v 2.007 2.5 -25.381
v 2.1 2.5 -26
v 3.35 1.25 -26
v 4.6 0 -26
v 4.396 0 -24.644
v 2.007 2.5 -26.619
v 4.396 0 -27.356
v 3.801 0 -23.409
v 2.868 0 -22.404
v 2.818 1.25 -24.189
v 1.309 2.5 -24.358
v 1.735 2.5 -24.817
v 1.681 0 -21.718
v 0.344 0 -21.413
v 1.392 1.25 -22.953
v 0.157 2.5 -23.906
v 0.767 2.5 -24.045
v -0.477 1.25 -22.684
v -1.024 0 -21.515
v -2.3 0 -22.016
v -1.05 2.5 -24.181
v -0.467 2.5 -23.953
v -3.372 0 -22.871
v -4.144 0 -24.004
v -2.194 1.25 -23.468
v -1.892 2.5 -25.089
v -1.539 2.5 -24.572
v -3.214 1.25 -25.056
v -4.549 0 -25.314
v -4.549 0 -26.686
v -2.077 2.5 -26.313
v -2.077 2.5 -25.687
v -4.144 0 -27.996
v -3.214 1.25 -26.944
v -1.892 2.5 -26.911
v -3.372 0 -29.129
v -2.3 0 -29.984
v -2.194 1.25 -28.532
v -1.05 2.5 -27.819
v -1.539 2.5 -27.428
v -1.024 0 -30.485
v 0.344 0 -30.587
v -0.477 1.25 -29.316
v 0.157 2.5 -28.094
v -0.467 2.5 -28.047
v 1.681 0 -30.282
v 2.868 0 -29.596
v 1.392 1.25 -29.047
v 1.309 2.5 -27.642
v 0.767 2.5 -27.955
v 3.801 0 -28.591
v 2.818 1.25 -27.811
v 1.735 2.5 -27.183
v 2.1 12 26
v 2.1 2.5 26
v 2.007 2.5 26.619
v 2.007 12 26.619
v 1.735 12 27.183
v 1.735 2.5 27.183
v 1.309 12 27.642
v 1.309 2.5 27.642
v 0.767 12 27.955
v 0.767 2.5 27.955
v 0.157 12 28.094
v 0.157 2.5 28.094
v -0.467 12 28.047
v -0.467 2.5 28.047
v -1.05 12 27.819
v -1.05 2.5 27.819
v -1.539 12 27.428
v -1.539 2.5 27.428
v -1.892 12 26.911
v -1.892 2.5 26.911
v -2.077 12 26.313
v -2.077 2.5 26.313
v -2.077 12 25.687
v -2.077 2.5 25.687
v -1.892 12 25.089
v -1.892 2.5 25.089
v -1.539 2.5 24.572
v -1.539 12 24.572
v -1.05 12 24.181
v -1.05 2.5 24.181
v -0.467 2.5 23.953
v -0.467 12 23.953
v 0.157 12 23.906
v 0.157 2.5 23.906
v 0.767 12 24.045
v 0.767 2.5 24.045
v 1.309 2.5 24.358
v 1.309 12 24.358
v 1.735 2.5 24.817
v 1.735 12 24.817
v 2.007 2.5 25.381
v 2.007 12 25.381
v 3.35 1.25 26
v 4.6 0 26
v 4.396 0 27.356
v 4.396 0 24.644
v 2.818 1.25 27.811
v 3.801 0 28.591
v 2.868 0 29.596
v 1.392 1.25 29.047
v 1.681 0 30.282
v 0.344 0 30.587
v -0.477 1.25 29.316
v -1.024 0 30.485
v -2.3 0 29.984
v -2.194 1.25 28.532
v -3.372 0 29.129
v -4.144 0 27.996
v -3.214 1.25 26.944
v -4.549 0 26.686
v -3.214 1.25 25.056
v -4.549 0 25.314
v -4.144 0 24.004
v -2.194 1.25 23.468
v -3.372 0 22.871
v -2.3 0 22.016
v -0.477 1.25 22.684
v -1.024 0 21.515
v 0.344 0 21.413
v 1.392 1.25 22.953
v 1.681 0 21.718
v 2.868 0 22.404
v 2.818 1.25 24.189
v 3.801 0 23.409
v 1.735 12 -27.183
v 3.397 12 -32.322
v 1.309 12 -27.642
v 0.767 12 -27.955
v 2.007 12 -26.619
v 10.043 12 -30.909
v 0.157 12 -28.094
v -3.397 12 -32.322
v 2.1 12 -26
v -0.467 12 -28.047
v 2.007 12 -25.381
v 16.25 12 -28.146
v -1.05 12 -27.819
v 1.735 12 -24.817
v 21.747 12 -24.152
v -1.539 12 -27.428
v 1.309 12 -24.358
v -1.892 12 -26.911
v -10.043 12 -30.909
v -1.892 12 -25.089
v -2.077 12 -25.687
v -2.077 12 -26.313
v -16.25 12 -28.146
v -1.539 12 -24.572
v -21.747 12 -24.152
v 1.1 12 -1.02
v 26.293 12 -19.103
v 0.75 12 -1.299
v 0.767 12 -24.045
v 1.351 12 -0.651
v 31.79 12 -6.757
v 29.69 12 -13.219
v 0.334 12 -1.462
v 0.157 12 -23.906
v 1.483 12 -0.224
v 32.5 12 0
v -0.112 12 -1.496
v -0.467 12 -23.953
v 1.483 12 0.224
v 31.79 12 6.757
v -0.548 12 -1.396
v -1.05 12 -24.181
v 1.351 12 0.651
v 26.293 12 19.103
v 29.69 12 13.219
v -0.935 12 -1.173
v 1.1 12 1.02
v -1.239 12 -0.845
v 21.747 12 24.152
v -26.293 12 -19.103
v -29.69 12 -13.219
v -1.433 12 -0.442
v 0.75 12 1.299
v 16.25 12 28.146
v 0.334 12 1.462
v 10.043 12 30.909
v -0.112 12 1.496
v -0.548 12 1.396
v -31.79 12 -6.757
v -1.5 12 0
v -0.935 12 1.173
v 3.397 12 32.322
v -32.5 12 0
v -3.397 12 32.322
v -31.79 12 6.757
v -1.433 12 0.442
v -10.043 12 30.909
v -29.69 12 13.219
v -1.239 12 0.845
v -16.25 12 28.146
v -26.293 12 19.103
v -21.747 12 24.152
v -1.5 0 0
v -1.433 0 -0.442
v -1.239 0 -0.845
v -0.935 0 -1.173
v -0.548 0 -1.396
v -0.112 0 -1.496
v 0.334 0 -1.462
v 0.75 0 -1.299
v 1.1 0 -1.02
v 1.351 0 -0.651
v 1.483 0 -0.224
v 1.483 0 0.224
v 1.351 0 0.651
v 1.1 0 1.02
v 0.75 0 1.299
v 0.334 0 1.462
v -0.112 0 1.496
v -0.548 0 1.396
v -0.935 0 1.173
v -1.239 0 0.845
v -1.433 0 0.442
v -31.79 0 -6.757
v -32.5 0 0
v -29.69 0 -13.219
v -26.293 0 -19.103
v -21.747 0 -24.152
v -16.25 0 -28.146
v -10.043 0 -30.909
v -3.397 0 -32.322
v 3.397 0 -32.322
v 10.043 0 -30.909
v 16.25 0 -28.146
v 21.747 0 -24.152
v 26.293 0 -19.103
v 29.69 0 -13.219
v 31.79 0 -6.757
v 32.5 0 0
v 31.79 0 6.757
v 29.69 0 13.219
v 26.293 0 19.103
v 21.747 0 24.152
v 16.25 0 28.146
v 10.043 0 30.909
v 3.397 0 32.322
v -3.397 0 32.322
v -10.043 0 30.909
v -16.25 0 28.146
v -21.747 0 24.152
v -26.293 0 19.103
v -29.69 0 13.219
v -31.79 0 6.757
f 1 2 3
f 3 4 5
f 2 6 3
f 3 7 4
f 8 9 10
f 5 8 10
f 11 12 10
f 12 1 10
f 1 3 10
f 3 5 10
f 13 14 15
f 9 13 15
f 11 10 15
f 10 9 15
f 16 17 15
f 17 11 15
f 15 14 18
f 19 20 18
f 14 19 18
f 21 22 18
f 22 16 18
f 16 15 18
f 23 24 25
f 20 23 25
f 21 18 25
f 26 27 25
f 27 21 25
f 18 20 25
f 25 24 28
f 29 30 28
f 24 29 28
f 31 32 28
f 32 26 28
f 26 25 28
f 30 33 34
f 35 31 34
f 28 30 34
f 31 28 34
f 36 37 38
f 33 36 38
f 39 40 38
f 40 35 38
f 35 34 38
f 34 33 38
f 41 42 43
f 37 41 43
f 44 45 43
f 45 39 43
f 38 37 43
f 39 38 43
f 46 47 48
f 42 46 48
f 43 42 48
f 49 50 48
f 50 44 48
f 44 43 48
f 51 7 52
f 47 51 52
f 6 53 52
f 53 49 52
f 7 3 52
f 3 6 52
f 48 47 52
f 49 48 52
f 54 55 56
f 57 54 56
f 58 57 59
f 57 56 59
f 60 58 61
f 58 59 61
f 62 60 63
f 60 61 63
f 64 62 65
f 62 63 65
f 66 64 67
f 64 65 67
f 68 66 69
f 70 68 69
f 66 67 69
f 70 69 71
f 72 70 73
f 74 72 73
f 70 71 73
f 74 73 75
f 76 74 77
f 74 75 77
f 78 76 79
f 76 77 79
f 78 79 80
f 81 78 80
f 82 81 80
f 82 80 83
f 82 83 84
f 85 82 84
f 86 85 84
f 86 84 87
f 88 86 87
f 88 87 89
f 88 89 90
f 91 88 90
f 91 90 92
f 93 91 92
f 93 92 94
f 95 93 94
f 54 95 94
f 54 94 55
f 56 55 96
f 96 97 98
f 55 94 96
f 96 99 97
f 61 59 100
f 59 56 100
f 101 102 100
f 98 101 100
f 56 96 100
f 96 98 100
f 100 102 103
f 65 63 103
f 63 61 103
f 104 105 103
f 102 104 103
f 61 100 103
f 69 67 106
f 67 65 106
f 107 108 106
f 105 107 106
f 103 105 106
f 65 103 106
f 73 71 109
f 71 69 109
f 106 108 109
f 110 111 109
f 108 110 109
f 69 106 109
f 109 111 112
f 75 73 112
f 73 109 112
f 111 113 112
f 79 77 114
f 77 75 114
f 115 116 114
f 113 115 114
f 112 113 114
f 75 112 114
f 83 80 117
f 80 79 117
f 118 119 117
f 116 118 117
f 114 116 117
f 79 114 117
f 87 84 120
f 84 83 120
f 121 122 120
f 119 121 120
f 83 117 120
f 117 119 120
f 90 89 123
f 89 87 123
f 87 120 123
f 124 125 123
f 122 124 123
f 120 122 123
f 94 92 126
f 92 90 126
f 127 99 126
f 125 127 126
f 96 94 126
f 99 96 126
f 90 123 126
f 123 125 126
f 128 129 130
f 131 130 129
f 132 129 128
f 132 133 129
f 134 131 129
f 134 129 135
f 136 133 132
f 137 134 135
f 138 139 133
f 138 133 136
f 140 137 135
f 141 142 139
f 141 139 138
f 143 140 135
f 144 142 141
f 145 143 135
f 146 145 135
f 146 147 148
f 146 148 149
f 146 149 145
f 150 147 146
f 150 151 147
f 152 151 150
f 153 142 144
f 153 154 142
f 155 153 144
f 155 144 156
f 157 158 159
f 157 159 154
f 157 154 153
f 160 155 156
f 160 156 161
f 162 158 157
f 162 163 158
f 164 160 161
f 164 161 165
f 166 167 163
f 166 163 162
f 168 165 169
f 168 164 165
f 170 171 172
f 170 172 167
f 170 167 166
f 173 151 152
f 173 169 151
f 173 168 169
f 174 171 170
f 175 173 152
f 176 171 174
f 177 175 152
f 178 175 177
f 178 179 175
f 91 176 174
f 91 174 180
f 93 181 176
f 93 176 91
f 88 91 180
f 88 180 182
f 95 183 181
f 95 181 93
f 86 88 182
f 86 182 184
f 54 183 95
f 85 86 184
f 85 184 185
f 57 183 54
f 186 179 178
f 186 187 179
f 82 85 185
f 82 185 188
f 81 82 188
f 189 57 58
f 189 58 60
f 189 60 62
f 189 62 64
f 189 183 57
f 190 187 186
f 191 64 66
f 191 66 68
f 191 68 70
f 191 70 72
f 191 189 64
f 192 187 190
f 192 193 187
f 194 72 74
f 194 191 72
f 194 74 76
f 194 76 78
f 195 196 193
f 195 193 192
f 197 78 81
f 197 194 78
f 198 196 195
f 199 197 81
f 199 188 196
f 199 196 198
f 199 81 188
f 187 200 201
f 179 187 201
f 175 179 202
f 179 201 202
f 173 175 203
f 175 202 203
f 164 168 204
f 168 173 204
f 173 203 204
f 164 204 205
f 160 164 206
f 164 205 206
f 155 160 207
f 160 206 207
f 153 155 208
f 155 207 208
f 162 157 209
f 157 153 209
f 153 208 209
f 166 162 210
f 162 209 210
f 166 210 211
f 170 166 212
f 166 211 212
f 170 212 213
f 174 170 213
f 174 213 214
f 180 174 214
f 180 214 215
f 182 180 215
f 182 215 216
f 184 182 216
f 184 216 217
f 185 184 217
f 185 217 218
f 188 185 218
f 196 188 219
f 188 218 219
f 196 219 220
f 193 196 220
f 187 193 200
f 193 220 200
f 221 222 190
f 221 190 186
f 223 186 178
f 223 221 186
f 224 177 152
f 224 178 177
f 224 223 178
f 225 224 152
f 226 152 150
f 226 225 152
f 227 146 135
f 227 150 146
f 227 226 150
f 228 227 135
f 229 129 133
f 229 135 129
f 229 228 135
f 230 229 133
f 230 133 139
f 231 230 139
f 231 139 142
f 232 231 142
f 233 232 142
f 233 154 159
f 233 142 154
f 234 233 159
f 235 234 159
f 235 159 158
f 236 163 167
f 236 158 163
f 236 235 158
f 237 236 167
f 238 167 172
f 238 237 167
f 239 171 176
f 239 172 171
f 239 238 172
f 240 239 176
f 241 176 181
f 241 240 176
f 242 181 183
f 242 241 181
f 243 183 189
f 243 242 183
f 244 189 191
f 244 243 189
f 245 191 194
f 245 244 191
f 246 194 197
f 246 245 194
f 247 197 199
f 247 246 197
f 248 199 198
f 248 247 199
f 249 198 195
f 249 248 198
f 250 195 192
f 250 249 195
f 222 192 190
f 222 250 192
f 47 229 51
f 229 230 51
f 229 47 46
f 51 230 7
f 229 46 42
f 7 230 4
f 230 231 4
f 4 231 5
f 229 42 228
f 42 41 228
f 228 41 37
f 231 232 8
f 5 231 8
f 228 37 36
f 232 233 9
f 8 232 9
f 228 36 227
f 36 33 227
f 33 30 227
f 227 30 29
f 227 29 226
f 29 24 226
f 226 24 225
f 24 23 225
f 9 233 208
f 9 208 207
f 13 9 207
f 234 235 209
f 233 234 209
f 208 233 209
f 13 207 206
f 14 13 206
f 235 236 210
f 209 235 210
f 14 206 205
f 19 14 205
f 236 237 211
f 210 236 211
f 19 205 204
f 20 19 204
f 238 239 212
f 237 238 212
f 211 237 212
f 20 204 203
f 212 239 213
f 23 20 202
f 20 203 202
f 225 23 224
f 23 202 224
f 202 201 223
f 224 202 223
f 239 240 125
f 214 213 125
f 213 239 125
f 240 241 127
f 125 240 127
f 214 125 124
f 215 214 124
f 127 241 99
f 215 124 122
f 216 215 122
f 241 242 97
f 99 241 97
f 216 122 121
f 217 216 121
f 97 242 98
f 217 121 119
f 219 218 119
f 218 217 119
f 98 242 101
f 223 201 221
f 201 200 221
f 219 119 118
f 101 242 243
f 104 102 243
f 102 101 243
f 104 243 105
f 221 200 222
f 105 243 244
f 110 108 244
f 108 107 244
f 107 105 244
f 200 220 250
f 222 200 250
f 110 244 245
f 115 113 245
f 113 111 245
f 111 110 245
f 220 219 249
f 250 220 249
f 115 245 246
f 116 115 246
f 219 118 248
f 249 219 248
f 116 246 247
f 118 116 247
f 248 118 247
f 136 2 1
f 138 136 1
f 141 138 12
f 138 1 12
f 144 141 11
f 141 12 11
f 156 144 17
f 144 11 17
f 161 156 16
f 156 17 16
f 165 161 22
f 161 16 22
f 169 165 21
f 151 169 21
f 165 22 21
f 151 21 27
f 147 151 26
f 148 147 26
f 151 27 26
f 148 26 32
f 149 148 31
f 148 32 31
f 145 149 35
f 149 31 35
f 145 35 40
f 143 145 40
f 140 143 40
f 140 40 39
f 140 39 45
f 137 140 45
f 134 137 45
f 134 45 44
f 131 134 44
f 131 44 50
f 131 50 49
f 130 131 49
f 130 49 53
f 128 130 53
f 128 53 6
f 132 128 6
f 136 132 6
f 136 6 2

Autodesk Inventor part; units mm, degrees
ref_plane "YZ Plane" through (0, 0, 0) normal (1, 0, 0) x (0, 1, 0)
ref_plane "XZ Plane" through (0, 0, 0) normal (0, 1, 0) x (-1, 0, 0)
ref_plane "XY Plane" through (0, 0, 0) normal (0, 0, 1) x (1, 0, 0)
sketch "Esboço1" plane through (0, 0, 0) normal (0, 1, 0) x (-1, 0, 0)
  circle A0 centre (0, 0) radius 32.5
  circle A1 centre (0, 0) radius 1.5
  dimension "d0" = 65
  dimension "d3" = 3
extrude "Extrusão1" add sketch "Esboço1" along normal blind 12
sketch "Esboço2" plane through (0, 0, 0) normal (0, -1, 0) x (1, 0, 0)
  circle A0 centre (0, 0) radius 1.5 projected
  circle A1 centre (0, 0) radius 26
  circle A2 centre (0, -26) radius 2.1
  circle A3 centre (0, 26) radius 2.1
  dimension "d4" = 4.2
  dimension "d5" = 4.2
  dimension "d11" = 52
extrude "Extrusão2" cut sketch "Esboço2" against normal blind 12 contours A3 A1 | A1 A3 | A2 A1 | A1 A2
chamfer "Chanfro1" distance 2.5 angle 45 2 edges at (-2.1, 0, 26) (-2.1, 0, -26)
properties part number "Inferior_encaixe"
